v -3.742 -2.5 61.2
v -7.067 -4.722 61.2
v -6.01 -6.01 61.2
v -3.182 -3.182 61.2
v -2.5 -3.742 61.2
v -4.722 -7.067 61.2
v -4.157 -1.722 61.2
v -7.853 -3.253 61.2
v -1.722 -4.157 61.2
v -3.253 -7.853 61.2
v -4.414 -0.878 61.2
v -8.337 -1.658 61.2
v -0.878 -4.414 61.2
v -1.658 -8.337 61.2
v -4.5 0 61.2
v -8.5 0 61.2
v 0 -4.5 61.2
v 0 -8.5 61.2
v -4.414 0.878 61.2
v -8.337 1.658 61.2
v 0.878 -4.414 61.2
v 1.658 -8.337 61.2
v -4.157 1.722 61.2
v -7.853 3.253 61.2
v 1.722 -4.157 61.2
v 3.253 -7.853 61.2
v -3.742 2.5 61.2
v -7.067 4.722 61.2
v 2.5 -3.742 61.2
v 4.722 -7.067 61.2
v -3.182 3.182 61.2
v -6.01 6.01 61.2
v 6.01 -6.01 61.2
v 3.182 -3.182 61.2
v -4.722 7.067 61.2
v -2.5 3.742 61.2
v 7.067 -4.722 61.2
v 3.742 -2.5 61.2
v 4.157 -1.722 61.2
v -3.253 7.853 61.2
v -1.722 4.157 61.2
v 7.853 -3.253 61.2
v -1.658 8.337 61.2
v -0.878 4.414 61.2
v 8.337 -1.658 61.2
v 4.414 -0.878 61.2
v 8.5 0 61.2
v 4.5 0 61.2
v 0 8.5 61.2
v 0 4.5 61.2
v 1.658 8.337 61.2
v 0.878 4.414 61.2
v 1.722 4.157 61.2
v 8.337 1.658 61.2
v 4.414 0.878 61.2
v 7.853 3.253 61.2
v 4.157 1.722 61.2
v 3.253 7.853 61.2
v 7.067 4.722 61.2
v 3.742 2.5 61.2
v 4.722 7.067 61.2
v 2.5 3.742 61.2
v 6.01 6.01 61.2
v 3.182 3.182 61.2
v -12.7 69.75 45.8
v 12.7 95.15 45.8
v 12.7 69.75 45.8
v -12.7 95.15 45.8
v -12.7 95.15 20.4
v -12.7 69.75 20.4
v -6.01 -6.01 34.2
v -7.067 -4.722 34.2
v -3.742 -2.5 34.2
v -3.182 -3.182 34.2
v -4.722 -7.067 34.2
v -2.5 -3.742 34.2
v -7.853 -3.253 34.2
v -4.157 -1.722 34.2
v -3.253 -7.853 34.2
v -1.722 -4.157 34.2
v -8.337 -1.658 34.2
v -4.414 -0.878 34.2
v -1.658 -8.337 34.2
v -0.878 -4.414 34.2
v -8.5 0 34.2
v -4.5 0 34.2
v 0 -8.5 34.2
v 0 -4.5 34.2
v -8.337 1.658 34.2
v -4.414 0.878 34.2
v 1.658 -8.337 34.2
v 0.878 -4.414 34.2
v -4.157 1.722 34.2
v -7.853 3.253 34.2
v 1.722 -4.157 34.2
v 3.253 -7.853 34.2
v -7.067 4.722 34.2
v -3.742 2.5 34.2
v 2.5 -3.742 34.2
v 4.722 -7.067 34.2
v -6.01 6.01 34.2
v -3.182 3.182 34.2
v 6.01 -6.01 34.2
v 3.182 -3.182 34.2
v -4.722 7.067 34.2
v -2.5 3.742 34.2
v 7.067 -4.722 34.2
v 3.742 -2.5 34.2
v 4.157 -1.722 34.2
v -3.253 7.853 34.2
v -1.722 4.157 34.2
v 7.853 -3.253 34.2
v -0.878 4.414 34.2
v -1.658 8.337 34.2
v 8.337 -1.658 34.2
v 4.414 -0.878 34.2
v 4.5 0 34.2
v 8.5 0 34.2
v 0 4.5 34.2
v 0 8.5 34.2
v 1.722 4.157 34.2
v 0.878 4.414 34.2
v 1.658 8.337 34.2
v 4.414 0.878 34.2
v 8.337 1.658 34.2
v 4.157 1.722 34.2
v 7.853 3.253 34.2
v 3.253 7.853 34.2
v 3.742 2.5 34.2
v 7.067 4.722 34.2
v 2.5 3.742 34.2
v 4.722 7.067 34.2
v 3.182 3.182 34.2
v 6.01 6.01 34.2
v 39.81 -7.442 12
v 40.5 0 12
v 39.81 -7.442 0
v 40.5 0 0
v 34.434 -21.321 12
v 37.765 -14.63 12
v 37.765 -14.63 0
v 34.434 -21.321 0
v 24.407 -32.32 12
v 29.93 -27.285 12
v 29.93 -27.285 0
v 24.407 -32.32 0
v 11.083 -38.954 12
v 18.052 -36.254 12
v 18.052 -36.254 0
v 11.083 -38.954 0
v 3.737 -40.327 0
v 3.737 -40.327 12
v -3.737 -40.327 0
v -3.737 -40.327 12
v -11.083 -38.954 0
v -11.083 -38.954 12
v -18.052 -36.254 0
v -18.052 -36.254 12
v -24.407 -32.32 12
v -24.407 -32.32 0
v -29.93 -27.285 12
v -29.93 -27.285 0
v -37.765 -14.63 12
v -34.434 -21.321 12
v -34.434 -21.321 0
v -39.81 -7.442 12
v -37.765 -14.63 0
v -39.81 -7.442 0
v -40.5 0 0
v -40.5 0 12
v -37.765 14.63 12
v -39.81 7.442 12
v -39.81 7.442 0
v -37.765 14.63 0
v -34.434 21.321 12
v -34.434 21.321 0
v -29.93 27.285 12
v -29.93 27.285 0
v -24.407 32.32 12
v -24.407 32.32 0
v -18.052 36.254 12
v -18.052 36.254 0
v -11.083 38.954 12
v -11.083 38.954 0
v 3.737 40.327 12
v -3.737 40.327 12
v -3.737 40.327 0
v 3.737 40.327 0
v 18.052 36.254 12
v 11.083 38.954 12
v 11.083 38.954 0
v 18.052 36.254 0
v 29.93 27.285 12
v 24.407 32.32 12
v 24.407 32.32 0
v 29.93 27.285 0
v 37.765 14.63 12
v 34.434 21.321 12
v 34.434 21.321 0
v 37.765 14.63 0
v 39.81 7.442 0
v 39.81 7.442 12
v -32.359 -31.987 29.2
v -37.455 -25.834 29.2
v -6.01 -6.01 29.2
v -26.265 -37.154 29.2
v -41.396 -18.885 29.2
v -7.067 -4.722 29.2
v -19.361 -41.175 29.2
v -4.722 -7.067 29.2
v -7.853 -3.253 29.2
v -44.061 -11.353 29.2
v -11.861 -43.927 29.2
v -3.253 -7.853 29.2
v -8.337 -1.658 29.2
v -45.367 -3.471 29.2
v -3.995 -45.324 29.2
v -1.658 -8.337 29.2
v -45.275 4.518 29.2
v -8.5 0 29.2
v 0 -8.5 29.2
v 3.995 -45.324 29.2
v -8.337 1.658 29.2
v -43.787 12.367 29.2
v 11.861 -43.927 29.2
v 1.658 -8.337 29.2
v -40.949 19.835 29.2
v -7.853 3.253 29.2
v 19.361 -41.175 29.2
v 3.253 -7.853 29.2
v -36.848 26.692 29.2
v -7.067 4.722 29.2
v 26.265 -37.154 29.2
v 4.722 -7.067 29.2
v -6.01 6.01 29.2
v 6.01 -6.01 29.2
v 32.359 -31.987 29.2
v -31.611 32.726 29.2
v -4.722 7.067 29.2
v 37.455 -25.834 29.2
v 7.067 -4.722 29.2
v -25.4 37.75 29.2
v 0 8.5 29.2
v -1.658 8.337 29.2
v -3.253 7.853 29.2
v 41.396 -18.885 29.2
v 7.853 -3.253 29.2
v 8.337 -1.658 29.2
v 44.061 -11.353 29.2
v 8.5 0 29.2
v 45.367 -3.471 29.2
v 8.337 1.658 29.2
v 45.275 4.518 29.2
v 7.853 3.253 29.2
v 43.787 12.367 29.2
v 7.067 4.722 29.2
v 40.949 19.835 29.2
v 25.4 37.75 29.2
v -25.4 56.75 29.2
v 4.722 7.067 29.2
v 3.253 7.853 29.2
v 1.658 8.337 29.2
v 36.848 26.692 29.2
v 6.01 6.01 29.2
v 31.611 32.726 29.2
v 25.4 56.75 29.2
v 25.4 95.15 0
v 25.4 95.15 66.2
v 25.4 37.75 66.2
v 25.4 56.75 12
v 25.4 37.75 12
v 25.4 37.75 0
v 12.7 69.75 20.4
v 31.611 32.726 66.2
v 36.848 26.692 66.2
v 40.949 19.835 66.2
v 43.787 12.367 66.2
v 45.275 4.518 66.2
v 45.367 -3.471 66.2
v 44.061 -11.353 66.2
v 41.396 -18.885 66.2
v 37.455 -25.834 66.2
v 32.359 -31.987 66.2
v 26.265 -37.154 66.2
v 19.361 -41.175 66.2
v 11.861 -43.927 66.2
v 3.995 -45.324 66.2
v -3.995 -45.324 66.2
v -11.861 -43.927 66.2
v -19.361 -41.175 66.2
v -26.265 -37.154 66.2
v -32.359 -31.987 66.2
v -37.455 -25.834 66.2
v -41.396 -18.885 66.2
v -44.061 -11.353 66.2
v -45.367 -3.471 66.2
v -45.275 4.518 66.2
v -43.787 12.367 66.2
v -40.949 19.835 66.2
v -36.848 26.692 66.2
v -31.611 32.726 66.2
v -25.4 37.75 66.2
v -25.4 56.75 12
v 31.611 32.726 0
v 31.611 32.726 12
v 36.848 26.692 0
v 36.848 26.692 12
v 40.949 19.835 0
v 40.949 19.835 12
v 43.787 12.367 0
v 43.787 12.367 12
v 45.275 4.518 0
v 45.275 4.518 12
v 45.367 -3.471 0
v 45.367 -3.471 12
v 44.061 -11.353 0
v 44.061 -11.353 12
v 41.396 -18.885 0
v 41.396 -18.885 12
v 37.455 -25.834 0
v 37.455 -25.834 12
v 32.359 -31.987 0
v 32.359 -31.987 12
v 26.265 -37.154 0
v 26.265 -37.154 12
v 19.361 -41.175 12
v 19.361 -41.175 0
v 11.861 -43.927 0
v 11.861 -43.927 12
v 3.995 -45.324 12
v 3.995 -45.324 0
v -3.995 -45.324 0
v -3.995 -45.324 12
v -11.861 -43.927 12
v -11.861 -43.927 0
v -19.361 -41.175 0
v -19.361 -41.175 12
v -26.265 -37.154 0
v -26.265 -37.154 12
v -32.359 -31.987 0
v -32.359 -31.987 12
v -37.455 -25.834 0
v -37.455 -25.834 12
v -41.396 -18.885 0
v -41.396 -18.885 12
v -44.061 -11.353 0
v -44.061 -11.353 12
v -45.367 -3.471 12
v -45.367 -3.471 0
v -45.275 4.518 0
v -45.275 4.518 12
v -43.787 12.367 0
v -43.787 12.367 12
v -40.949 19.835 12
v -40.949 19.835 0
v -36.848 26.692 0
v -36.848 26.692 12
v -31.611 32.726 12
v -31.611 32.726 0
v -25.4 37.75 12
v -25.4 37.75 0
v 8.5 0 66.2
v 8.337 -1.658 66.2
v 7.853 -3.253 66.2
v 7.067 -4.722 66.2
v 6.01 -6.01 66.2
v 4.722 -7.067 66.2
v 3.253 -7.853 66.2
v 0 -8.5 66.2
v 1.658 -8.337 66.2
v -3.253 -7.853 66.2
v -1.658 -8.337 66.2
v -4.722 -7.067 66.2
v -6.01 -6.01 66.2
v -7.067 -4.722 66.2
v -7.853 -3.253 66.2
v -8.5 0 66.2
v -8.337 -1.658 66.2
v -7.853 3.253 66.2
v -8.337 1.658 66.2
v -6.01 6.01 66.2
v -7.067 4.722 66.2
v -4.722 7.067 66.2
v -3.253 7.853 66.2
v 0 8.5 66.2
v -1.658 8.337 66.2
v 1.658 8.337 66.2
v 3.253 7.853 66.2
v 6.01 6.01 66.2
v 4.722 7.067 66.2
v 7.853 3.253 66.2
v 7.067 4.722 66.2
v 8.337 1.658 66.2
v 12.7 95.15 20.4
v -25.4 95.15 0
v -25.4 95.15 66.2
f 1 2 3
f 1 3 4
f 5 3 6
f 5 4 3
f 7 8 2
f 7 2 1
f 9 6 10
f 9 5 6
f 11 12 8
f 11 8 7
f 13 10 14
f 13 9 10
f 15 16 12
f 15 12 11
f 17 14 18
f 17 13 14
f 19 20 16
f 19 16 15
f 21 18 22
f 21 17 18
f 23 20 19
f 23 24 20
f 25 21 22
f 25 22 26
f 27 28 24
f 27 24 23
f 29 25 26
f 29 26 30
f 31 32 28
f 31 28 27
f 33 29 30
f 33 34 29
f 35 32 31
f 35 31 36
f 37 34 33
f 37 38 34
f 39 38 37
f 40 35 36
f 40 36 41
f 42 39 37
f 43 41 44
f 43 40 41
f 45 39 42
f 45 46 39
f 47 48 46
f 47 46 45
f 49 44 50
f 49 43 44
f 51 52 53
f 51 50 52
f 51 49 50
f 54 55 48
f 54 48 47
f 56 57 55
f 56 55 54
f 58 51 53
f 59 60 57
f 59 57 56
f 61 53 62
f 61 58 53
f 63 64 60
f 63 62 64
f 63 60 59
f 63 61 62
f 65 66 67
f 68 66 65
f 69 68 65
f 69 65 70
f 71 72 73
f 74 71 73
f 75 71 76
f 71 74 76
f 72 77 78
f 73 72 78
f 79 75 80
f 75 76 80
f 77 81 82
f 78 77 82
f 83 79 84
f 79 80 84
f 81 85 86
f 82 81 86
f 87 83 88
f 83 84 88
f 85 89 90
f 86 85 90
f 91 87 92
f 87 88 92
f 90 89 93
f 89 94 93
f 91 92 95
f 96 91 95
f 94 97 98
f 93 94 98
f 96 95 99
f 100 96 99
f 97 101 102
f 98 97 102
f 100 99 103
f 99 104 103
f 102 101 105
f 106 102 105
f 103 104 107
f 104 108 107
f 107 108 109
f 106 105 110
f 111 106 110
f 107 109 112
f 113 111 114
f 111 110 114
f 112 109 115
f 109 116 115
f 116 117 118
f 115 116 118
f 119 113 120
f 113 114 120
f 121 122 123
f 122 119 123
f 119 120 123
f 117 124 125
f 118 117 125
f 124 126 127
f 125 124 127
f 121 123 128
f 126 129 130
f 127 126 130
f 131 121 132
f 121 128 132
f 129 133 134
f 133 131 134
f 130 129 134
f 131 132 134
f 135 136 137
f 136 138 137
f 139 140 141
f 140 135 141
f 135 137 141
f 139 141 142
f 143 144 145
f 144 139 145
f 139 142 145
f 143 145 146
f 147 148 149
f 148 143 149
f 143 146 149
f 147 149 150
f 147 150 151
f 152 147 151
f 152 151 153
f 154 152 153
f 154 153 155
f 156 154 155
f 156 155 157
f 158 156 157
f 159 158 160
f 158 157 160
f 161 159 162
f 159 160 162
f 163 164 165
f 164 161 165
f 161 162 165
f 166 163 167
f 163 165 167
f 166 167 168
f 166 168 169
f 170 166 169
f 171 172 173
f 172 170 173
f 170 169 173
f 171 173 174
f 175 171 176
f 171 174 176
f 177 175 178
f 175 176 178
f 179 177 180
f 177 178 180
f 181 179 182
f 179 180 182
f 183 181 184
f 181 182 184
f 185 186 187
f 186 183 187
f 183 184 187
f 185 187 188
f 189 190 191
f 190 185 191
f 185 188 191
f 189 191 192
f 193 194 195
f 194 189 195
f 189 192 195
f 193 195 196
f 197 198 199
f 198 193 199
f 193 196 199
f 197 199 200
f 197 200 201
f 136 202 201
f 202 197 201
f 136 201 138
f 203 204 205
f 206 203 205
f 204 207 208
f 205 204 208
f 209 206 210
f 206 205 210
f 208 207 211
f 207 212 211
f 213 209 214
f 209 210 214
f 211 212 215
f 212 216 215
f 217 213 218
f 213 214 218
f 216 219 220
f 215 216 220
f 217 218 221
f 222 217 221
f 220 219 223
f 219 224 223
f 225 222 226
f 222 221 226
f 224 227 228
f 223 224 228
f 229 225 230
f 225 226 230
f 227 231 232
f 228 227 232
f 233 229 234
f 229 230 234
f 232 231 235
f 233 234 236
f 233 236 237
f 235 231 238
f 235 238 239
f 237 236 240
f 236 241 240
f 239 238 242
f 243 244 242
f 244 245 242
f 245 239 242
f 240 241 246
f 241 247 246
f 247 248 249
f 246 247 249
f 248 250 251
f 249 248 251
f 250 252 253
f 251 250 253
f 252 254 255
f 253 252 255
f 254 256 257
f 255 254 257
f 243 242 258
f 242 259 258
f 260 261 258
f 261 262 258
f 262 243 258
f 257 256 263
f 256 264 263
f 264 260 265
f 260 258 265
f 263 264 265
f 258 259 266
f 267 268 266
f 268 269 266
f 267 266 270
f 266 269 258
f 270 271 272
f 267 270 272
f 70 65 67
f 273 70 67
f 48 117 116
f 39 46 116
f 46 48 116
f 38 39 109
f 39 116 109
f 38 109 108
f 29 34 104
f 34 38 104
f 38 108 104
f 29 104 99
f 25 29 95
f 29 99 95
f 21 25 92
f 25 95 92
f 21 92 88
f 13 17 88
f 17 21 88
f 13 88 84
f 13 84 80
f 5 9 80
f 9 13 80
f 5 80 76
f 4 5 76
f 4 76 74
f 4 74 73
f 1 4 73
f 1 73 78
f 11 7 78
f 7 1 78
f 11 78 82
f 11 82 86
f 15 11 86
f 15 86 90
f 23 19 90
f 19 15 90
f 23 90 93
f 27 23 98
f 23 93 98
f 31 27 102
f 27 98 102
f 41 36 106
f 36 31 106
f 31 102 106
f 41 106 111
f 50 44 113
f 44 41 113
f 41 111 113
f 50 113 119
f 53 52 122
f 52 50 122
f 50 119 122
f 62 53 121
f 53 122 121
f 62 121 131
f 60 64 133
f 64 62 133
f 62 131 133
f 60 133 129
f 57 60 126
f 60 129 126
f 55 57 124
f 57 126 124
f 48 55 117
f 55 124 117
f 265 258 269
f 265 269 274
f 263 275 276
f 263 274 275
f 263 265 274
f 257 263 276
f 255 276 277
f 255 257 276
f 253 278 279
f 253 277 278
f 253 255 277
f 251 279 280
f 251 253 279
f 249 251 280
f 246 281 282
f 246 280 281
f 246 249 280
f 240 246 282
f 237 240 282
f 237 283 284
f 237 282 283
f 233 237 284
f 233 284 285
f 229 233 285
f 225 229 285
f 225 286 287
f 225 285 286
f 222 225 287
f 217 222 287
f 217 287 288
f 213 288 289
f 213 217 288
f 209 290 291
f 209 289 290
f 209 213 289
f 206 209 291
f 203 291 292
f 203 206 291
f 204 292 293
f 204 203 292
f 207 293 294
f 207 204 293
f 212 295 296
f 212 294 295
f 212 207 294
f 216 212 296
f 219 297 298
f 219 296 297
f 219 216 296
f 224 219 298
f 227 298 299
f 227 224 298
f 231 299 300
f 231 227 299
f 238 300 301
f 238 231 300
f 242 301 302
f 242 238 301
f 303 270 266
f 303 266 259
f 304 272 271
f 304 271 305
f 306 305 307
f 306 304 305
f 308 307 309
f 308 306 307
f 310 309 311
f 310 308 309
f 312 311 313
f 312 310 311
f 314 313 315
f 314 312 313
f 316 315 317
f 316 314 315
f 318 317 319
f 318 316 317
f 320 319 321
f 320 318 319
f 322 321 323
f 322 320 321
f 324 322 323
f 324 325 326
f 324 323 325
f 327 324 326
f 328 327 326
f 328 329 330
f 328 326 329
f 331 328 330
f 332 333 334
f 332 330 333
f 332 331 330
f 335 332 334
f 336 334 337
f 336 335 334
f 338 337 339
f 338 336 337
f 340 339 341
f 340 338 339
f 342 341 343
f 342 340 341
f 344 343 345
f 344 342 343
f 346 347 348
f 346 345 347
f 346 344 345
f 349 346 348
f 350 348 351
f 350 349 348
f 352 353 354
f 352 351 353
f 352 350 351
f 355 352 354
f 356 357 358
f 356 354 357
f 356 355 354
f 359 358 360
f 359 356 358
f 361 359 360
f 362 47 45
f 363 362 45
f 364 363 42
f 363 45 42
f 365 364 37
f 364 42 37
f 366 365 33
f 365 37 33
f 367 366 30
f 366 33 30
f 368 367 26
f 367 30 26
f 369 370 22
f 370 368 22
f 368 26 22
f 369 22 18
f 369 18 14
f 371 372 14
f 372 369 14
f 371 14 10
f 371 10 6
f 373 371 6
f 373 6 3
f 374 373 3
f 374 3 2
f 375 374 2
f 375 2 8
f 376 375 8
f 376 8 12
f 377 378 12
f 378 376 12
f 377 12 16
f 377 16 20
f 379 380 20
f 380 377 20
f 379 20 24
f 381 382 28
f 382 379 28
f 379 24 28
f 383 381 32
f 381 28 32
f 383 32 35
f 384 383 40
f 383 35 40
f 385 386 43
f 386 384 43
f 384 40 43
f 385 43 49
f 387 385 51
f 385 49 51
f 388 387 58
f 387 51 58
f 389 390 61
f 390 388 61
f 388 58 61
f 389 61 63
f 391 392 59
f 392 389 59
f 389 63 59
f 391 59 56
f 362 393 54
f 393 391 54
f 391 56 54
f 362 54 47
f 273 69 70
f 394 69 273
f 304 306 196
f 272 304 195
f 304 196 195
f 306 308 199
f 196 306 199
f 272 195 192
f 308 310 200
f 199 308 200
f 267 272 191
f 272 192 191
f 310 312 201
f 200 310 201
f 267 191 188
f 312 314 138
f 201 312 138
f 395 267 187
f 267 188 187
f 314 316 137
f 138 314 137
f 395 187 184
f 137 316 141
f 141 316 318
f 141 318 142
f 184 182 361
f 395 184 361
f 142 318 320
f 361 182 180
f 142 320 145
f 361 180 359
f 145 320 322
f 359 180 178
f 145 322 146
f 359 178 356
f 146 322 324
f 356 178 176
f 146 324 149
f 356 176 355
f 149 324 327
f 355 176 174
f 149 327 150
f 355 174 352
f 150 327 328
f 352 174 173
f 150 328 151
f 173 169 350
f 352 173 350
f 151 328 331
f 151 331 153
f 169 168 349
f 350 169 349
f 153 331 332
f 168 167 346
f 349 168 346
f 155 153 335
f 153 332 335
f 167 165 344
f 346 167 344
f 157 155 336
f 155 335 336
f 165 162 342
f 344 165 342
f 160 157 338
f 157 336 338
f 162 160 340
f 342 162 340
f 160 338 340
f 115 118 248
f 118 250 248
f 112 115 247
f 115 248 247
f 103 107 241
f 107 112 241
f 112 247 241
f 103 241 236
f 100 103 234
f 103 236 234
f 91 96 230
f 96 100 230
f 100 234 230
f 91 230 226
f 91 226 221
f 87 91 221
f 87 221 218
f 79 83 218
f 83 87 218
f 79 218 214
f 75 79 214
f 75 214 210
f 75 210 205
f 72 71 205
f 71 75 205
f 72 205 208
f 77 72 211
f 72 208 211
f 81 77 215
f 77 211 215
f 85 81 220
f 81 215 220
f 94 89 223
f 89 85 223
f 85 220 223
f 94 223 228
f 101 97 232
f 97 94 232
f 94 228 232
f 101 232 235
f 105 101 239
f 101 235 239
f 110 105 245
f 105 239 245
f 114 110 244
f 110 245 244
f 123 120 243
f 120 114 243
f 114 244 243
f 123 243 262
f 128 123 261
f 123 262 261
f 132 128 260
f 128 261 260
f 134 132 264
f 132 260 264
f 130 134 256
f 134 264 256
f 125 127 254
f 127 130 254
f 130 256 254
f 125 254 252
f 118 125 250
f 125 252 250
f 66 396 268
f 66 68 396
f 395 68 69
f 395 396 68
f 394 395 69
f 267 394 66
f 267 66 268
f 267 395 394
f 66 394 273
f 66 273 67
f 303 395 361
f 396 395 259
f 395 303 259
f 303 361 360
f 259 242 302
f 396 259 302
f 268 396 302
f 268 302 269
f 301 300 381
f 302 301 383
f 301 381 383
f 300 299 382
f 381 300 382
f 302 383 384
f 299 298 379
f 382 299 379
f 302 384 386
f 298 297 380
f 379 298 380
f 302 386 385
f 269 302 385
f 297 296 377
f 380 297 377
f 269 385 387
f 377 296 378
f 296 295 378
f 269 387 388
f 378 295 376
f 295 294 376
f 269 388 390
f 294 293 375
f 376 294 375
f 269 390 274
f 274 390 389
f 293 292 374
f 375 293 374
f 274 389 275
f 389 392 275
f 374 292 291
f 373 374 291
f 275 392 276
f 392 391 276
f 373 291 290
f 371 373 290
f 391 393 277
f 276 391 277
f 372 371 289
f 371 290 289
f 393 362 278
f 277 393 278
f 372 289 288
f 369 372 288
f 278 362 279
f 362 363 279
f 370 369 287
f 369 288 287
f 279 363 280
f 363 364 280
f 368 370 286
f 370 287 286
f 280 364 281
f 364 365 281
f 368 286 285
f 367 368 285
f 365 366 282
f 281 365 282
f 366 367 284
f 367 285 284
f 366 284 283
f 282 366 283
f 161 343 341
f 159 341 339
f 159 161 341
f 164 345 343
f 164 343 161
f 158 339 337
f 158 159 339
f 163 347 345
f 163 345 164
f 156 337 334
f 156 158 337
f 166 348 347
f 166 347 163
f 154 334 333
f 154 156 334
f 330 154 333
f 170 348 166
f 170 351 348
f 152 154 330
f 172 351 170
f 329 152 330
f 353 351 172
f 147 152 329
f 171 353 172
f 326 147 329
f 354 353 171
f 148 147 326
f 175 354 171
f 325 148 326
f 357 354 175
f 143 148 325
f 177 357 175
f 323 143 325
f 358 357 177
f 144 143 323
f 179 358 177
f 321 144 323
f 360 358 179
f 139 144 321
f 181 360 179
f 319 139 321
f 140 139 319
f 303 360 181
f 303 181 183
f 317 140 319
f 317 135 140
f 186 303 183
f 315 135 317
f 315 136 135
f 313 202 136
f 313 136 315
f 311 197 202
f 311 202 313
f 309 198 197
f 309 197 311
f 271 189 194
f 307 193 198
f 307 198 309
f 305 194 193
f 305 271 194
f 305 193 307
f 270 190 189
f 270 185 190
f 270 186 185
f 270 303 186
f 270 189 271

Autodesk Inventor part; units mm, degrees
ref_plane "YZ Plane" through (0, 0, 0) normal (1, 0, 0) x (0, 1, 0)
ref_plane "XZ Plane" through (0, 0, 0) normal (0, 1, 0) x (-1, 0, 0)
ref_plane "XY Plane" through (0, 0, 0) normal (0, 0, 1) x (1, 0, 0)
sketch "Sketch1" plane through (0, 0, 0) normal (0, 0, 1) x (1, 0, 0)
  circle A0 centre (0, 0) radius 40.5
  arc A1 (-25.4, 37.7504) -> (25.4, 37.7504) centre (0, 0) ccw
  line L0 (-25.4, 37.7504) -> (-25.4, 57.7504)
  line L1 (-25.4, 57.7504) -> (25.4, 57.7504)
  line L2 (25.4, 57.7504) -> (25.4, 37.7504)
  dimension "d1" = 5
  dimension "d9" = 20
extrude "Extrusion1" add sketch "Sketch1" along normal blind 12
sketch "Sketch2" plane through (-25.4, 57.7504, 0) normal (0, 1, 0) x (1, 0, 0)
  line L0 (0, -12) -> (50.8, -12)
  line L1 (50.8, -12) -> (50.8, 0)
  line L2 (50.8, 0) -> (0, 0)
  line L3 (0, 0) -> (0, -12)
  point P0 (25.4, 0)
extrude "Extrusion2" add sketch "Sketch2" along normal blind 12
sketch "Sketch3" plane through (0, 0, 12) normal (0, 0, 1) x (1, 0, 0)
  line L0 (-25.4, 37.7504) -> (-25.4, 69.7504) projected
  line L1 (25.4, 37.7504) -> (25.4, 69.7504) projected
  line L2 (-25.4, 69.7504) -> (25.4, 69.7504)
  line L3 (25.4, 69.7504) -> (25.4, 56.7504)
  line L4 (25.4, 56.7504) -> (-25.4, 56.7504)
  line L5 (-25.4, 56.7504) -> (-25.4, 69.7504)
  point P0 (0, 0)
  dimension "d12" = 13
extrude "Extrusion3" add sketch "Sketch3" along normal blind 17.2
sketch "Sketch4" plane through (0, 0, 29.2) normal (0, 0, 1) x (1, 0, 0)
  line L0 (25.4, 69.7504) -> (-25.4, 69.7504) projected
  line L1 (-25.4, 69.7504) -> (-25.4, 37.7504)
  circle A0 centre (0, 0) radius 8.5
  arc A1 (-25.4, 37.7504) -> (25.4, 37.7504) centre (0, 0) ccw
  arc A2 (-25.4, 37.7504) -> (25.4, 37.7504) centre (0, 0) ccw projected
  line L2 (25.4, 37.7504) -> (25.4, 69.7504) projected
  line L3 (25.4, 37.7504) -> (25.4, 69.7504)
  line L4 (25.4, 69.7504) -> (-25.4, 69.7504)
  dimension "d15" = 17
extrude "Extrusion4" add sketch "Sketch4" along normal blind 5
sketch "Sketch5" plane through (0, 0, 34.2) normal (0, 0, 1) x (1, 0, 0)
  arc A0 (-25.4, 37.7504) -> (25.4, 37.7504) centre (0, 0) ccw
  circle A1 centre (0, 0) radius 4.5
  line L0 (-25.4, 37.7504) -> (-25.4, 69.7504) projected
  line L1 (-25.4, 37.7504) -> (-25.4, 69.7504)
  line L2 (25.4, 69.7504) -> (-25.4, 69.7504) projected
  line L3 (-25.4, 69.7504) -> (25.4, 69.7504)
  line L4 (25.4, 69.7504) -> (25.4, 37.7504)
  dimension "d18" = 9
extrude "Extrusion5" add sketch "Sketch5" along normal blind 27
sketch "Sketch6" plane through (0, 0, 61.2) normal (0, 0, 1) x (1, 0, 0)
  line L0 (25.4, 69.7504) -> (-25.4, 69.7504) projected
  line L1 (-25.4, 56.7504) -> (-25.4, 37.7504) projected
  line L2 (-25.4, 69.7504) -> (-25.4, 37.7504)
  line L3 (-25.4, 69.7504) -> (25.4, 69.7504)
  arc A0 (-25.4, 37.7504) -> (25.4, 37.7504) centre (0, 0) ccw projected
  line L4 (25.4, 37.7504) -> (25.4, 69.7504)
  arc A1 (-25.4, 37.7504) -> (25.4, 37.7504) centre (0, 0) ccw
  circle A2 centre (0, 0) radius 8.5
  dimension "d21" = 17
extrude "Extrusion6" add sketch "Sketch6" along normal blind 5
sketch "Sketch7" plane through (-25.4, 69.7504, 0) normal (0, 1, 0) x (1, 0, 0)
  line L0 (50.8, 0) -> (0, 0) projected
  line L1 (0, -29.2) -> (0, -66.2) projected
  line L2 (50.8, 0) -> (0, 0)
  line L3 (0, 0) -> (0, -66.2)
  line L4 (0, -66.2) -> (50.8, -66.2)
  line L5 (50.8, -66.2) -> (50.8, 0)
  point P0 (25.4, 0)
extrude "Extrusion7" add sketch "Sketch7" along normal blind 25.4
sketch "Sketch8" plane through (-25.4, 95.1504, 0) normal (0, 1, 0) x (1, 0, 0)
  line L0 (0, -66.2) -> (50.8, -66.2) projected
  line L1 (0, -66.2) -> (50.8, -66.2)
  line L2 (50.8, -66.2) -> (25.4, -66.2)
  line L3 (33.9, -66.2) -> (16.9, -66.2) projected
  line L4 (50.8, -29.2) -> (50.8, -66.2) projected
  line L5 (50.8, 0) -> (50.8, -12) projected
  line L6 (50.8, -66.2) -> (50.8, 0)
  line L7 (50.8, 0) -> (50.8, -33.1)
  line L8 (12.7, -20.4) -> (38.1, -20.4)
  line L9 (38.1, -20.4) -> (38.1, -45.8)
  line L10 (38.1, -45.8) -> (12.7, -45.8)
  line L11 (12.7, -45.8) -> (12.7, -20.4)
  line L12 (43.1, -15.4) -> (7.7, -15.4)
  line L13 (7.7, -15.4) -> (7.7, -50.8)
  line L14 (7.7, -50.8) -> (43.1, -50.8)
  line L15 (43.1, -50.8) -> (43.1, -15.4)
  point P0 (25.4, 0)
  dimension "d30" = 5
extrude "Extrusion8" cut sketch "Sketch8" against normal blind 25.4 contours L8 L9 L10 L11
properties part number "Tilt_Portion"
